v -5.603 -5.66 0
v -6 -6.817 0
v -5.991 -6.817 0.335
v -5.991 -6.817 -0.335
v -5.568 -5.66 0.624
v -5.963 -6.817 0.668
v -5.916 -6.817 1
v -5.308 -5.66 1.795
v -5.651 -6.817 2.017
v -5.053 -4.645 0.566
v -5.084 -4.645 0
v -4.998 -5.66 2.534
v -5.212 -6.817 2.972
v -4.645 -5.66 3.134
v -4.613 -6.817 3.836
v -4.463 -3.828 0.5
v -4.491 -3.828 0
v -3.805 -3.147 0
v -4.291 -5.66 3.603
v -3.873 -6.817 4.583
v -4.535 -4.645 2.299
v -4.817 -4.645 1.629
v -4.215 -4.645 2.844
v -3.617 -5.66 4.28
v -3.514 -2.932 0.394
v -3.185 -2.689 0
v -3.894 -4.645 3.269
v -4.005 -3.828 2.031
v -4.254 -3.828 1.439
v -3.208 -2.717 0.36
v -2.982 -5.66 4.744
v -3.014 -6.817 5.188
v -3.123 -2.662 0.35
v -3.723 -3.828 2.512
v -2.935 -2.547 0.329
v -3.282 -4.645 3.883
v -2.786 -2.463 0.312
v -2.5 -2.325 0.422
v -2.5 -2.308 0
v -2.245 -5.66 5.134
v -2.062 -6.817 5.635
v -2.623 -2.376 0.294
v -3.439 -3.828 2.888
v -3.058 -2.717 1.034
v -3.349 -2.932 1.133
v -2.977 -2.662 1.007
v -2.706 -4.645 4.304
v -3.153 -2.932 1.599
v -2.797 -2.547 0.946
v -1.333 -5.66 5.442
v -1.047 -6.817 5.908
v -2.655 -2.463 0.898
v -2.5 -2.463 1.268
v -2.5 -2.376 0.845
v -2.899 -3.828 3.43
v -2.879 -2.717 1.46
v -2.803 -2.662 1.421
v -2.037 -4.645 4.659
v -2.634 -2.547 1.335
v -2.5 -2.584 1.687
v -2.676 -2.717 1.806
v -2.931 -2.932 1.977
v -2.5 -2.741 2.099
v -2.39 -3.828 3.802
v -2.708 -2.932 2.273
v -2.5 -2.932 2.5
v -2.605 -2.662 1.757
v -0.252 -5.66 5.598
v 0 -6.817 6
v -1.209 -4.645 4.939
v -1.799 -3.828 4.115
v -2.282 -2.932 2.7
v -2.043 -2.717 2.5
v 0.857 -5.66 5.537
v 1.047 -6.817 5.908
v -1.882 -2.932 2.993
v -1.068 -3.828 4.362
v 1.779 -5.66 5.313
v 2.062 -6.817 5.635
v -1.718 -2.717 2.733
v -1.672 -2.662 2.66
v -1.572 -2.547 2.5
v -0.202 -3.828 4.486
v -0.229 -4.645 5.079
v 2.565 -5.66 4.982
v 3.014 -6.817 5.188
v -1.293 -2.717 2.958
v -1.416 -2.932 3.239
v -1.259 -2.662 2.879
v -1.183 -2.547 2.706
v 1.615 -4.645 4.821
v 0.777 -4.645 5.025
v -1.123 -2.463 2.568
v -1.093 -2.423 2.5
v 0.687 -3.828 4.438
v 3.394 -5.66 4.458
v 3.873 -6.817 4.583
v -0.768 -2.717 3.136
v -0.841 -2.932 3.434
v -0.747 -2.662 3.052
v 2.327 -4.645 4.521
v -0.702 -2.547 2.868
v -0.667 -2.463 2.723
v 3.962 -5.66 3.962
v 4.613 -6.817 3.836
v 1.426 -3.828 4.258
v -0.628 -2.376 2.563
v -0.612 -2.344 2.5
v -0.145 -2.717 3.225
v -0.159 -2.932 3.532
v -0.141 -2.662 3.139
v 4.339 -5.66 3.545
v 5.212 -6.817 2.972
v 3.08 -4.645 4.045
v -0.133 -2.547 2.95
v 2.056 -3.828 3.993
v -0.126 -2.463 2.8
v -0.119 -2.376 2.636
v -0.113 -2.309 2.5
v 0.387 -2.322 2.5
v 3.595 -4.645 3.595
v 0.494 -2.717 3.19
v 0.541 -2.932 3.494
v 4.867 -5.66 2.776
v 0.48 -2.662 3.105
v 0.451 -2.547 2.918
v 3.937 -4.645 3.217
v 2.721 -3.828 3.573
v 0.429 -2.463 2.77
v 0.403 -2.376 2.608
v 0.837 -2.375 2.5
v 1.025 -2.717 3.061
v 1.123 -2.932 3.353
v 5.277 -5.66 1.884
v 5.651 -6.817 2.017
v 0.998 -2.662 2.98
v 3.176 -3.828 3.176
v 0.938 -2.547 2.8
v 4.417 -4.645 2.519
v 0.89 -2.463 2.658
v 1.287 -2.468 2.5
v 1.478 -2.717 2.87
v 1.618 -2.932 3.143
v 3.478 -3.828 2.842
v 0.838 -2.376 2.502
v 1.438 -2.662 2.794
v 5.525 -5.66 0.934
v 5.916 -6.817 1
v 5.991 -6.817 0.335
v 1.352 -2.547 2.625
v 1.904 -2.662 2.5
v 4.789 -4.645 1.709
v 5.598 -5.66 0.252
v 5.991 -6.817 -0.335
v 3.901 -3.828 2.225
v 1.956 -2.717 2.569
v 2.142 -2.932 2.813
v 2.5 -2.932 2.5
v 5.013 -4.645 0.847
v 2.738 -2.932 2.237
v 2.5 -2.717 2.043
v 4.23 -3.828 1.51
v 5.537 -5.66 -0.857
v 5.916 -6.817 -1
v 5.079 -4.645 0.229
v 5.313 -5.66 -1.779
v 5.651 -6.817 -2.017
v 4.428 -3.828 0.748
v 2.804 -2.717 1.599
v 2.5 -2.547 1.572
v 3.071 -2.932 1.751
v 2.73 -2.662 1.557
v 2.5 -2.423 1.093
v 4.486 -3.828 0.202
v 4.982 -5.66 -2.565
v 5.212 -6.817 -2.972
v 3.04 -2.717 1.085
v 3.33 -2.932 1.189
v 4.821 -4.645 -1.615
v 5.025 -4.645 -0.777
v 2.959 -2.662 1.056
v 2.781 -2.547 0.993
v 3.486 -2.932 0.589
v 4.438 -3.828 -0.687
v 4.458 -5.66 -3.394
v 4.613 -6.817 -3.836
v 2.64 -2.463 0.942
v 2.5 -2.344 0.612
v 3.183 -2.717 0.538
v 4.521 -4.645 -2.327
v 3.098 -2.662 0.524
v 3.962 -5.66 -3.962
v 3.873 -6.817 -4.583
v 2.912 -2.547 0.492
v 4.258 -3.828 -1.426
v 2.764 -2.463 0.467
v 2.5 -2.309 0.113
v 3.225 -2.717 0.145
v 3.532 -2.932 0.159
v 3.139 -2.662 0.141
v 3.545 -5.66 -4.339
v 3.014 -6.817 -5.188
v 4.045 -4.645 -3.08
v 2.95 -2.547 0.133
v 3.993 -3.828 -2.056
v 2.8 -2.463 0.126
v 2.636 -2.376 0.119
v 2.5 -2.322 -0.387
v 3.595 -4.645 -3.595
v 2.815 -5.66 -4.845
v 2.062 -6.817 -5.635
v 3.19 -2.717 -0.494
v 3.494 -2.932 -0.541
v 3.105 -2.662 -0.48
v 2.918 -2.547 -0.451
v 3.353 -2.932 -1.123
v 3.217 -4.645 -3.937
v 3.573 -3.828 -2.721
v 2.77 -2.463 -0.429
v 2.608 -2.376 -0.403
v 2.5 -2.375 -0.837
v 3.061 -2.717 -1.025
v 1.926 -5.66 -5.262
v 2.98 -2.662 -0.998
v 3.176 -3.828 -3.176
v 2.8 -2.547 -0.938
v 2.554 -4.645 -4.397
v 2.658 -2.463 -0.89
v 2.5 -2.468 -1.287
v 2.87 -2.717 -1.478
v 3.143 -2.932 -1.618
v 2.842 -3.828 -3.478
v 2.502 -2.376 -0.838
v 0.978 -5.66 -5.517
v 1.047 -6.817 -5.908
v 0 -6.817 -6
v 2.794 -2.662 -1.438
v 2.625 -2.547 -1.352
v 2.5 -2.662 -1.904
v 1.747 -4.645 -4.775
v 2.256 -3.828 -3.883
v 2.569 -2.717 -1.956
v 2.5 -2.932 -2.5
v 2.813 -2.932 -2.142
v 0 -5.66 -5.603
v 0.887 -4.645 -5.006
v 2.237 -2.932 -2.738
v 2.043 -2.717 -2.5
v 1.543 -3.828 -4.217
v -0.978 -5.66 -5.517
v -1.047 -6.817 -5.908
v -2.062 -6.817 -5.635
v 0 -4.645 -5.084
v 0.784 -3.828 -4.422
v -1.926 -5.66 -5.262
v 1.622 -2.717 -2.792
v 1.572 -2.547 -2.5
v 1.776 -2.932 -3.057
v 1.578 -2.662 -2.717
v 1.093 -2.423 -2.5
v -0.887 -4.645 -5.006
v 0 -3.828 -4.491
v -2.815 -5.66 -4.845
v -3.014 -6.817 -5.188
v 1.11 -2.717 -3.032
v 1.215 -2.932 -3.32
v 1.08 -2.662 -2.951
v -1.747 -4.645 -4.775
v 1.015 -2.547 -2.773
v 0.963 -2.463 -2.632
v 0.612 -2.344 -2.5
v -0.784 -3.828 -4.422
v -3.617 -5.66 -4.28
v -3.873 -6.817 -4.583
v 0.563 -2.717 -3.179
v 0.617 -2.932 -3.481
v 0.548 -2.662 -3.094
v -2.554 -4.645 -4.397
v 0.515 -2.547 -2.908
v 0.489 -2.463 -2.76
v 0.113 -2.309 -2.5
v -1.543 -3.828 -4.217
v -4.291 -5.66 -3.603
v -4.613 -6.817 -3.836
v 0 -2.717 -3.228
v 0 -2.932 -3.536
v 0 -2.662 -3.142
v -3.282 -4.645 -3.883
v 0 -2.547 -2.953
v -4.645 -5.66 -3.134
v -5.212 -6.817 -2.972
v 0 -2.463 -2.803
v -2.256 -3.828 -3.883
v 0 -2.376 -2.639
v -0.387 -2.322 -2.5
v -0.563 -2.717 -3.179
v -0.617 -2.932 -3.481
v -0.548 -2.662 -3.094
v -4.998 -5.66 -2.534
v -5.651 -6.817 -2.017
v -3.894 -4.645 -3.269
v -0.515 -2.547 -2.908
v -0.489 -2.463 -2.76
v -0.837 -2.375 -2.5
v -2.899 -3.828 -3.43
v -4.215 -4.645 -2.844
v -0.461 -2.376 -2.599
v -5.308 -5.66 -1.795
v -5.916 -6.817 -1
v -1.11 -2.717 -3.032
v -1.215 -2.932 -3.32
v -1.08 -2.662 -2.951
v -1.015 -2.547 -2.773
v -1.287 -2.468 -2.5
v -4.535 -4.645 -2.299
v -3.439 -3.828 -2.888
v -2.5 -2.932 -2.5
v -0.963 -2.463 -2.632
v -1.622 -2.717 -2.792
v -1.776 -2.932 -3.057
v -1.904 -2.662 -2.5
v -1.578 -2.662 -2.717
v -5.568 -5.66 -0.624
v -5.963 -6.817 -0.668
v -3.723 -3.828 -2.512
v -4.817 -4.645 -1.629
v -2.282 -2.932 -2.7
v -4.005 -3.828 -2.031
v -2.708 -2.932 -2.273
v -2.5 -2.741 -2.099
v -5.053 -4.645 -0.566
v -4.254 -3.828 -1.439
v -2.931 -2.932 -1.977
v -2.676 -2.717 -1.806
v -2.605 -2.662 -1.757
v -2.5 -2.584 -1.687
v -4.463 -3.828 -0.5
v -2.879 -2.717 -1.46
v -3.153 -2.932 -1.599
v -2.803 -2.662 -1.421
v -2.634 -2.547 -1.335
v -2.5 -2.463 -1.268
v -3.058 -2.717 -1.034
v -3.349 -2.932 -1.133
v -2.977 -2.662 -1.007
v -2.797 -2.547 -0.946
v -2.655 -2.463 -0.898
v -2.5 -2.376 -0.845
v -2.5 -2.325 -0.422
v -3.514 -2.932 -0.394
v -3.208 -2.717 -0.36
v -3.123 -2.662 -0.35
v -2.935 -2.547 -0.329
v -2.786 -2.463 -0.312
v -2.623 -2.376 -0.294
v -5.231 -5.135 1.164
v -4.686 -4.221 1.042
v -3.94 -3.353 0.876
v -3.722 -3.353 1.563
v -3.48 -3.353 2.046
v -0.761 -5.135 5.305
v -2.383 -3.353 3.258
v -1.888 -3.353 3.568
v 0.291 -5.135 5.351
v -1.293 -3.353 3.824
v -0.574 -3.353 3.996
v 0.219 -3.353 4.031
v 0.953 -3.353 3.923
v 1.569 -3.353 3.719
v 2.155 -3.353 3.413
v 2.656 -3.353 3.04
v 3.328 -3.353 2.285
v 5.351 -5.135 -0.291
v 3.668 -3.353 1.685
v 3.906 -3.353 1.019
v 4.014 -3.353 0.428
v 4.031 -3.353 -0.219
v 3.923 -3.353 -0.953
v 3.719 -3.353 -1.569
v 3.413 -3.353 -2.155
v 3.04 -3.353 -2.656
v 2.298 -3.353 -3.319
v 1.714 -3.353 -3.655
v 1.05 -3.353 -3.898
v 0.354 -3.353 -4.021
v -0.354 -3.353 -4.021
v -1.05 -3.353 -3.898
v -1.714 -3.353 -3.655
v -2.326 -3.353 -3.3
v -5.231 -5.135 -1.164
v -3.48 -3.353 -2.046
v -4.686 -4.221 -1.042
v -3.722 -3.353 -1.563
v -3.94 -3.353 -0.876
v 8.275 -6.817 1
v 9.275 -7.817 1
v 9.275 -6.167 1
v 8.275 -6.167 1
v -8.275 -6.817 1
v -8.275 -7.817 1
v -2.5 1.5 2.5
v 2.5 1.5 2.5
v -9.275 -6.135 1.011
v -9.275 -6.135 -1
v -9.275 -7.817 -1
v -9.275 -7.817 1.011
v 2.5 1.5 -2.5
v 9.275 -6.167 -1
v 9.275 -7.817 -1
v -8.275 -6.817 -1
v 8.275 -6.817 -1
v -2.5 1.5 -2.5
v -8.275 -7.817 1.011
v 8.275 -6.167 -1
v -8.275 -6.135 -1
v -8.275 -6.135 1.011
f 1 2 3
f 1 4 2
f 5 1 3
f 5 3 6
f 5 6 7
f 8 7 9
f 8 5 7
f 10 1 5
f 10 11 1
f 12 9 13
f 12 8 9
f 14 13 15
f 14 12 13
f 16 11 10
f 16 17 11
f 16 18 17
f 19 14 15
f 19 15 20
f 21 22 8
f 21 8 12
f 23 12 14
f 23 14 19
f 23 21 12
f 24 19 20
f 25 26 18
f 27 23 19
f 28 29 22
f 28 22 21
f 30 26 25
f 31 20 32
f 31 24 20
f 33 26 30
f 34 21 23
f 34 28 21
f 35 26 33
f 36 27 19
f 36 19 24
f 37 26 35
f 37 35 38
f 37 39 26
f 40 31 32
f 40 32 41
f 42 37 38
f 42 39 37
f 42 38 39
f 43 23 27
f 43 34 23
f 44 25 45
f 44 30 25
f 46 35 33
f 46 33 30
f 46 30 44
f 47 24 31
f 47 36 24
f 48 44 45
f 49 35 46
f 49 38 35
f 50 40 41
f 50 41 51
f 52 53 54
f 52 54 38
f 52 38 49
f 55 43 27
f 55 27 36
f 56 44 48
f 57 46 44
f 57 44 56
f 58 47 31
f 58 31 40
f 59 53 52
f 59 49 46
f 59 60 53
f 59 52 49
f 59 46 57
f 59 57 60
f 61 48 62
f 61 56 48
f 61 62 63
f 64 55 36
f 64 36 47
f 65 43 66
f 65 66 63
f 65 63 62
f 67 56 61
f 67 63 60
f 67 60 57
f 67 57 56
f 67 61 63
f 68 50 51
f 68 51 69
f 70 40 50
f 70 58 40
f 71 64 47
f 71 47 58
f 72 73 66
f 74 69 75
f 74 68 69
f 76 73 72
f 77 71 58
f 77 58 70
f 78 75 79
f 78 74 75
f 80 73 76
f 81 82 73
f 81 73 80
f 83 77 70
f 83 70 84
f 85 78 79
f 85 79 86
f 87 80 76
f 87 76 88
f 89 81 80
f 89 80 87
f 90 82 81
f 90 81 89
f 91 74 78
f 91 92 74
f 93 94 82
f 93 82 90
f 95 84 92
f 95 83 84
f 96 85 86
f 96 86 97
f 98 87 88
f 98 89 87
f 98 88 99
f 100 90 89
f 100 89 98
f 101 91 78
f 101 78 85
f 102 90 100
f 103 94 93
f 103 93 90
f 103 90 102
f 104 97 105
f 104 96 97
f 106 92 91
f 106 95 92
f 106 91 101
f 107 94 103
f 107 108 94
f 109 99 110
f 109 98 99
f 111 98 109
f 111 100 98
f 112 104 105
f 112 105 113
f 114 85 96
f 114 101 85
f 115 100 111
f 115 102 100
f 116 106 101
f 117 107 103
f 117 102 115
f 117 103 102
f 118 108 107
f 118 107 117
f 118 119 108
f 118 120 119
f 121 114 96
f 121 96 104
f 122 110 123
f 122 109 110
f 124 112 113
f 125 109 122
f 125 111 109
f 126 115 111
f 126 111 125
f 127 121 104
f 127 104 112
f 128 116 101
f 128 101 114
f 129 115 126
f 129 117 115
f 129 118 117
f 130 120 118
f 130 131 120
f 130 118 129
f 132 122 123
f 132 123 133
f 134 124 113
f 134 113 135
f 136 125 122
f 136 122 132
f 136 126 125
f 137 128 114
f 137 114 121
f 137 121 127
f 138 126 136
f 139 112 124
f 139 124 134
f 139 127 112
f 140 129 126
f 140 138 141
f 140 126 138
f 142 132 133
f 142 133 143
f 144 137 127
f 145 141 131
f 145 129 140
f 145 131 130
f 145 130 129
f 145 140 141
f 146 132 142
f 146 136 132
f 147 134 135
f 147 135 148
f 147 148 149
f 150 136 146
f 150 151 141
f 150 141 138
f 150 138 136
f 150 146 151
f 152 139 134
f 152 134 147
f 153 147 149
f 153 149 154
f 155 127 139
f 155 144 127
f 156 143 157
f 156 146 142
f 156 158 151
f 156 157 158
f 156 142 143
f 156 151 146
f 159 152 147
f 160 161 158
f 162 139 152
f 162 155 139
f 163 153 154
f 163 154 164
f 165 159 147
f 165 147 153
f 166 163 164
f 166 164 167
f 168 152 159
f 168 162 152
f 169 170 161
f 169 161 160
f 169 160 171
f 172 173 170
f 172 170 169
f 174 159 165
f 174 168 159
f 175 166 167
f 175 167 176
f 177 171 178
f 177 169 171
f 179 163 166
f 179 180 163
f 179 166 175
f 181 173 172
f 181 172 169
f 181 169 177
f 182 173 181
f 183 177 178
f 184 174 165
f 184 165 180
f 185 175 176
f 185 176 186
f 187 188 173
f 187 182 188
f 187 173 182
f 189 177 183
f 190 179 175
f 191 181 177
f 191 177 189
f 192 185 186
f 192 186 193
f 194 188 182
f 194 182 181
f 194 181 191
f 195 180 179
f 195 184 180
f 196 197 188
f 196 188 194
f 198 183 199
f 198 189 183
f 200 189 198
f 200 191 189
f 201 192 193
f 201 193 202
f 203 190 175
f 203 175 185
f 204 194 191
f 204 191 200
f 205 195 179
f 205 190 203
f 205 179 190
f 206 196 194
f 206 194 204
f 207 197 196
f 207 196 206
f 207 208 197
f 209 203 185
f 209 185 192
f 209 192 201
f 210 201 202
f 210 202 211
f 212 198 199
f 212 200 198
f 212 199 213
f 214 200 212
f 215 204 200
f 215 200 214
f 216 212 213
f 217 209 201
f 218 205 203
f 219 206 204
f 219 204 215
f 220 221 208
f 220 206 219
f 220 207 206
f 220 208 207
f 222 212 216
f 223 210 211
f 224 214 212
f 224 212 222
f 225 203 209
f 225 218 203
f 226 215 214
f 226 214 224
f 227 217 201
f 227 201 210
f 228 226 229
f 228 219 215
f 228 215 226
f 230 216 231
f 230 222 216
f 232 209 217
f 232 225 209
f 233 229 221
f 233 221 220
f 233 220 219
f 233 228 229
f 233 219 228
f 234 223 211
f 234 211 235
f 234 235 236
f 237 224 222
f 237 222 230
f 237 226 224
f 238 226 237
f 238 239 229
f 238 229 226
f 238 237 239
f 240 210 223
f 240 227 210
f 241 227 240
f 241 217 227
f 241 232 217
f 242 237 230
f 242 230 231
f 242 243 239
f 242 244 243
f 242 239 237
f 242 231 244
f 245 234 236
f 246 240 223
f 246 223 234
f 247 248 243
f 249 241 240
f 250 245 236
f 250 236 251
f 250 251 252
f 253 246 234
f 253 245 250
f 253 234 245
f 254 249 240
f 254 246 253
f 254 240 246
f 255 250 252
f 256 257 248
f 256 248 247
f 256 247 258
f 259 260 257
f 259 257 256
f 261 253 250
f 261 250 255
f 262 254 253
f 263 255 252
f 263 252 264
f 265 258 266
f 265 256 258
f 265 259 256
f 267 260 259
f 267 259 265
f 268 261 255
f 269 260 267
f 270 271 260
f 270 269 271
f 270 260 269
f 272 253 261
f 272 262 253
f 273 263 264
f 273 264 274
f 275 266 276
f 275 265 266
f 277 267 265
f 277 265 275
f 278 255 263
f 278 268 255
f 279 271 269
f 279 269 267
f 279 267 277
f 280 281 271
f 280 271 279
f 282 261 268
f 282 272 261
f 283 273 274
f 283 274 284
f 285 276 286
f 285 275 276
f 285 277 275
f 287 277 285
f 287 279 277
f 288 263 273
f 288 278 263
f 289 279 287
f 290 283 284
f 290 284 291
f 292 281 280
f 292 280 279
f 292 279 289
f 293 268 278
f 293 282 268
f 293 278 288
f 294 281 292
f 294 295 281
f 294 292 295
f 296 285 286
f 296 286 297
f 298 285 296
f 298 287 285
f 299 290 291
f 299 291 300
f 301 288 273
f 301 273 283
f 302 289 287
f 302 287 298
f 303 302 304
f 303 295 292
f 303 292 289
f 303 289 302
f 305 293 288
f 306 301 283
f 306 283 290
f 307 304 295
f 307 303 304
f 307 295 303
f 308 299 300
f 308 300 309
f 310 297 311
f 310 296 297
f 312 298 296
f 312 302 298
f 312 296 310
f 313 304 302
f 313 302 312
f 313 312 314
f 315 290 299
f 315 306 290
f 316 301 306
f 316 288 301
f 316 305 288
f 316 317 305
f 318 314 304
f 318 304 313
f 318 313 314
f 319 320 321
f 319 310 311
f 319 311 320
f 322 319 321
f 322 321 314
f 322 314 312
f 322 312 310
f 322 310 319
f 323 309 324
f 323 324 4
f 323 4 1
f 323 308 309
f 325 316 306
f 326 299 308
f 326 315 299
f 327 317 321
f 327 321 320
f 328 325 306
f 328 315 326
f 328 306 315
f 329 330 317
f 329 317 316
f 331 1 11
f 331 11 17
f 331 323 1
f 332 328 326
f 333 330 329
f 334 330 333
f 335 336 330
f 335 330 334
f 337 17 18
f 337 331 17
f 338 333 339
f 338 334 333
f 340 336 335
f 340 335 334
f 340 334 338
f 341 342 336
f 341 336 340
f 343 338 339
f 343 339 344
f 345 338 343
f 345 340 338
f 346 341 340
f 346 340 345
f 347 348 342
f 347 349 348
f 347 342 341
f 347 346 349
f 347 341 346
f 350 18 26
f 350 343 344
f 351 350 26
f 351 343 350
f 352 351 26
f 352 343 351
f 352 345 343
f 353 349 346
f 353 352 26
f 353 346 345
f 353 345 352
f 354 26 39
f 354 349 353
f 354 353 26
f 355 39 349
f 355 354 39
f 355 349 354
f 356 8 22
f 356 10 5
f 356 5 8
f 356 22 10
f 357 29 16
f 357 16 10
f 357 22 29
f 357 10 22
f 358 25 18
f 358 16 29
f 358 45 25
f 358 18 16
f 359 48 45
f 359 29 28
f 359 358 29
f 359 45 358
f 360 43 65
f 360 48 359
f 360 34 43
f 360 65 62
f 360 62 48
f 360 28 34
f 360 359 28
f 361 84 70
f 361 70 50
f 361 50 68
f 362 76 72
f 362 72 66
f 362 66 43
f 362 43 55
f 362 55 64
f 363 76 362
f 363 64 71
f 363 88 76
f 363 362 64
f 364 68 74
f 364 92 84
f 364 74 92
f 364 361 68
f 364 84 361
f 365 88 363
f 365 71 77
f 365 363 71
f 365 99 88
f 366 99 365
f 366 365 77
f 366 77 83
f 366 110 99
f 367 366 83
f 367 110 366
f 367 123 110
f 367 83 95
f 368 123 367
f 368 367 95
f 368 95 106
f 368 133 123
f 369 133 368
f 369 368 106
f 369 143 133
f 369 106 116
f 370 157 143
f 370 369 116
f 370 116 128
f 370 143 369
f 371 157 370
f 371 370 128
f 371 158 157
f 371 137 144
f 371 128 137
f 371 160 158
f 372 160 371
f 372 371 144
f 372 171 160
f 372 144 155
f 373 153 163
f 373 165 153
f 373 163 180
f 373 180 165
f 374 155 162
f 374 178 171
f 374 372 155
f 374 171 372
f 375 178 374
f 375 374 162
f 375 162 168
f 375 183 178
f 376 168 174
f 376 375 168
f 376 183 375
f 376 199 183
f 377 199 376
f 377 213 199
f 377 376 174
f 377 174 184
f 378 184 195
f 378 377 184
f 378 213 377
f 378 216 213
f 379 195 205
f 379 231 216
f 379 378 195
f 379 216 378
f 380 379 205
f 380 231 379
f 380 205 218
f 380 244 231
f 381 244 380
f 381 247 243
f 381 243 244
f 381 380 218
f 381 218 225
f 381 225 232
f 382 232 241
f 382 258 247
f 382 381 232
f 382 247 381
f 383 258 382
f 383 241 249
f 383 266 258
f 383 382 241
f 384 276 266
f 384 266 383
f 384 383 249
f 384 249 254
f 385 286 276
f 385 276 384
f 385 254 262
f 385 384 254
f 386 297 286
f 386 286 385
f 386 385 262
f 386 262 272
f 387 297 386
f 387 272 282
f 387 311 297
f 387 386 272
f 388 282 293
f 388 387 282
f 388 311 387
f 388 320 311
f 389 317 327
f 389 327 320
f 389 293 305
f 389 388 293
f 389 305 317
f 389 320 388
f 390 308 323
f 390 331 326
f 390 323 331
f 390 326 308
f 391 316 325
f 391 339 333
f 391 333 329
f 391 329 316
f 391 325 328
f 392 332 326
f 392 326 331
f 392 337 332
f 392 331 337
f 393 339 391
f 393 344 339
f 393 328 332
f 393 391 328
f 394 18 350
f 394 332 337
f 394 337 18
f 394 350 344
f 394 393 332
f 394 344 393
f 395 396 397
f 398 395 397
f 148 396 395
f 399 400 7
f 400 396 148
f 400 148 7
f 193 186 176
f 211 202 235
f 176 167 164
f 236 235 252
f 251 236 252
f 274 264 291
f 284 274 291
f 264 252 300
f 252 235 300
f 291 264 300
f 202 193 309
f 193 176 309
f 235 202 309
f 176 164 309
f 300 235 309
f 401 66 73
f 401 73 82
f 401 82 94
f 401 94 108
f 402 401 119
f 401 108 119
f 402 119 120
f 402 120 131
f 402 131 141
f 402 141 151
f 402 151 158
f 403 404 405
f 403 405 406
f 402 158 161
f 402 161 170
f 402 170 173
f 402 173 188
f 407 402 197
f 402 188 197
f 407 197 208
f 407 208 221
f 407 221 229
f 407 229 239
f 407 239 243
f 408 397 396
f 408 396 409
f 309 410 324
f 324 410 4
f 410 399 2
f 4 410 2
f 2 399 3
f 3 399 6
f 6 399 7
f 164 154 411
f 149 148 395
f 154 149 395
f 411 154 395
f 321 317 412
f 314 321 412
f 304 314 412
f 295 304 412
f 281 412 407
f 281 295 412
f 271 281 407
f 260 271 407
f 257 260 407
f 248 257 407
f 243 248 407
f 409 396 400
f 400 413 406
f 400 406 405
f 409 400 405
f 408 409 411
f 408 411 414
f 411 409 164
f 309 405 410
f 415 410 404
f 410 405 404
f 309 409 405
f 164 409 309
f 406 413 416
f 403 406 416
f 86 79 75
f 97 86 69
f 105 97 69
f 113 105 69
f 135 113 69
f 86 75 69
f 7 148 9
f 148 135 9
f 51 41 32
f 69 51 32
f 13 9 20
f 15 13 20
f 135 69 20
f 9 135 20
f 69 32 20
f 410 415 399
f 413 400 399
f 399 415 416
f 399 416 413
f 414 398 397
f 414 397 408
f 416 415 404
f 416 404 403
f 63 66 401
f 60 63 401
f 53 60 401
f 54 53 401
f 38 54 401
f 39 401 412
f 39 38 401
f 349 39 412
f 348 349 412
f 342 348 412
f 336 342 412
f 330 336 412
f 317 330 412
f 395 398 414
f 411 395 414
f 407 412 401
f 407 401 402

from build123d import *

# Parameters (mm, degrees)
EXTRUDE_1_DEPTH      = 1.5
EXTRUDE_1_DEPTH_BACK = 3
SKETCH_1_W           = 5
SKETCH_1_H           = 5
SKETCH_3_W           = 16.55
SKETCH_3_H           = 2
EXTRUDE_2_DEPTH      = 1
SKETCH_4_W           = 2.010575614
SKETCH_4_H           = 1.682122854
EXTRUDE_3_DEPTH      = 1
SKETCH_5_W           = 2
SKETCH_5_H           = 1.650542366
EXTRUDE_4_DEPTH      = 1


with BuildPart() as part:
    # 草图1 → 凸台-拉伸1 (new, two sides: drawn at the far end of the back side and taken through both)
    with BuildSketch(Plane(origin=(0, 0, 0), x_dir=(1, 0, 0), z_dir=(0, 1, 0)).offset(-EXTRUDE_1_DEPTH_BACK)):
        Rectangle(SKETCH_1_W, SKETCH_1_H)
    extrude(amount=EXTRUDE_1_DEPTH + EXTRUDE_1_DEPTH_BACK)

    # 草图2 → 旋转1 (revolve)
    with BuildSketch(Plane.XY):
        with BuildLine():
            Line((-6, -6.817094506), (0, -6.817094506))
            Line((0, -6.817094506), (0, -1.613202234))
            add(Edge.make_bspline(
                [(-6, -6.817094506), (-4.734338842, -2.184392528), (0, -1.613202234)],
                knots=[0, 0, 0, 1, 1, 1], degree=2))
        make_face()
    revolve(axis=Axis((0, -6.817094506, 0), (0, 1, 0)))

    # 草图3 → 凸台-拉伸2 (add)
    with BuildSketch(Plane.XZ.offset(6.817094506)):
        Rectangle(SKETCH_3_W, SKETCH_3_H)
    extrude(amount=EXTRUDE_2_DEPTH)

    # 草图4 → 凸台-拉伸3 (add)
    with BuildSketch(Plane.ZY.offset(8.275)):
        with Locations((0.005287807, -6.976033079)):
            Rectangle(SKETCH_4_W, SKETCH_4_H)
    extrude(amount=EXTRUDE_3_DEPTH)

    # 草图5 → 凸台-拉伸4 (add)
    with BuildSketch(Plane(origin=(8.275, 0, 0), x_dir=(0, 0, -1), z_dir=(1, 0, 0))):
        with Locations((0, -6.991823323)):
            Rectangle(SKETCH_5_W, SKETCH_5_H)
    extrude(amount=EXTRUDE_4_DEPTH)


solid = part.part
